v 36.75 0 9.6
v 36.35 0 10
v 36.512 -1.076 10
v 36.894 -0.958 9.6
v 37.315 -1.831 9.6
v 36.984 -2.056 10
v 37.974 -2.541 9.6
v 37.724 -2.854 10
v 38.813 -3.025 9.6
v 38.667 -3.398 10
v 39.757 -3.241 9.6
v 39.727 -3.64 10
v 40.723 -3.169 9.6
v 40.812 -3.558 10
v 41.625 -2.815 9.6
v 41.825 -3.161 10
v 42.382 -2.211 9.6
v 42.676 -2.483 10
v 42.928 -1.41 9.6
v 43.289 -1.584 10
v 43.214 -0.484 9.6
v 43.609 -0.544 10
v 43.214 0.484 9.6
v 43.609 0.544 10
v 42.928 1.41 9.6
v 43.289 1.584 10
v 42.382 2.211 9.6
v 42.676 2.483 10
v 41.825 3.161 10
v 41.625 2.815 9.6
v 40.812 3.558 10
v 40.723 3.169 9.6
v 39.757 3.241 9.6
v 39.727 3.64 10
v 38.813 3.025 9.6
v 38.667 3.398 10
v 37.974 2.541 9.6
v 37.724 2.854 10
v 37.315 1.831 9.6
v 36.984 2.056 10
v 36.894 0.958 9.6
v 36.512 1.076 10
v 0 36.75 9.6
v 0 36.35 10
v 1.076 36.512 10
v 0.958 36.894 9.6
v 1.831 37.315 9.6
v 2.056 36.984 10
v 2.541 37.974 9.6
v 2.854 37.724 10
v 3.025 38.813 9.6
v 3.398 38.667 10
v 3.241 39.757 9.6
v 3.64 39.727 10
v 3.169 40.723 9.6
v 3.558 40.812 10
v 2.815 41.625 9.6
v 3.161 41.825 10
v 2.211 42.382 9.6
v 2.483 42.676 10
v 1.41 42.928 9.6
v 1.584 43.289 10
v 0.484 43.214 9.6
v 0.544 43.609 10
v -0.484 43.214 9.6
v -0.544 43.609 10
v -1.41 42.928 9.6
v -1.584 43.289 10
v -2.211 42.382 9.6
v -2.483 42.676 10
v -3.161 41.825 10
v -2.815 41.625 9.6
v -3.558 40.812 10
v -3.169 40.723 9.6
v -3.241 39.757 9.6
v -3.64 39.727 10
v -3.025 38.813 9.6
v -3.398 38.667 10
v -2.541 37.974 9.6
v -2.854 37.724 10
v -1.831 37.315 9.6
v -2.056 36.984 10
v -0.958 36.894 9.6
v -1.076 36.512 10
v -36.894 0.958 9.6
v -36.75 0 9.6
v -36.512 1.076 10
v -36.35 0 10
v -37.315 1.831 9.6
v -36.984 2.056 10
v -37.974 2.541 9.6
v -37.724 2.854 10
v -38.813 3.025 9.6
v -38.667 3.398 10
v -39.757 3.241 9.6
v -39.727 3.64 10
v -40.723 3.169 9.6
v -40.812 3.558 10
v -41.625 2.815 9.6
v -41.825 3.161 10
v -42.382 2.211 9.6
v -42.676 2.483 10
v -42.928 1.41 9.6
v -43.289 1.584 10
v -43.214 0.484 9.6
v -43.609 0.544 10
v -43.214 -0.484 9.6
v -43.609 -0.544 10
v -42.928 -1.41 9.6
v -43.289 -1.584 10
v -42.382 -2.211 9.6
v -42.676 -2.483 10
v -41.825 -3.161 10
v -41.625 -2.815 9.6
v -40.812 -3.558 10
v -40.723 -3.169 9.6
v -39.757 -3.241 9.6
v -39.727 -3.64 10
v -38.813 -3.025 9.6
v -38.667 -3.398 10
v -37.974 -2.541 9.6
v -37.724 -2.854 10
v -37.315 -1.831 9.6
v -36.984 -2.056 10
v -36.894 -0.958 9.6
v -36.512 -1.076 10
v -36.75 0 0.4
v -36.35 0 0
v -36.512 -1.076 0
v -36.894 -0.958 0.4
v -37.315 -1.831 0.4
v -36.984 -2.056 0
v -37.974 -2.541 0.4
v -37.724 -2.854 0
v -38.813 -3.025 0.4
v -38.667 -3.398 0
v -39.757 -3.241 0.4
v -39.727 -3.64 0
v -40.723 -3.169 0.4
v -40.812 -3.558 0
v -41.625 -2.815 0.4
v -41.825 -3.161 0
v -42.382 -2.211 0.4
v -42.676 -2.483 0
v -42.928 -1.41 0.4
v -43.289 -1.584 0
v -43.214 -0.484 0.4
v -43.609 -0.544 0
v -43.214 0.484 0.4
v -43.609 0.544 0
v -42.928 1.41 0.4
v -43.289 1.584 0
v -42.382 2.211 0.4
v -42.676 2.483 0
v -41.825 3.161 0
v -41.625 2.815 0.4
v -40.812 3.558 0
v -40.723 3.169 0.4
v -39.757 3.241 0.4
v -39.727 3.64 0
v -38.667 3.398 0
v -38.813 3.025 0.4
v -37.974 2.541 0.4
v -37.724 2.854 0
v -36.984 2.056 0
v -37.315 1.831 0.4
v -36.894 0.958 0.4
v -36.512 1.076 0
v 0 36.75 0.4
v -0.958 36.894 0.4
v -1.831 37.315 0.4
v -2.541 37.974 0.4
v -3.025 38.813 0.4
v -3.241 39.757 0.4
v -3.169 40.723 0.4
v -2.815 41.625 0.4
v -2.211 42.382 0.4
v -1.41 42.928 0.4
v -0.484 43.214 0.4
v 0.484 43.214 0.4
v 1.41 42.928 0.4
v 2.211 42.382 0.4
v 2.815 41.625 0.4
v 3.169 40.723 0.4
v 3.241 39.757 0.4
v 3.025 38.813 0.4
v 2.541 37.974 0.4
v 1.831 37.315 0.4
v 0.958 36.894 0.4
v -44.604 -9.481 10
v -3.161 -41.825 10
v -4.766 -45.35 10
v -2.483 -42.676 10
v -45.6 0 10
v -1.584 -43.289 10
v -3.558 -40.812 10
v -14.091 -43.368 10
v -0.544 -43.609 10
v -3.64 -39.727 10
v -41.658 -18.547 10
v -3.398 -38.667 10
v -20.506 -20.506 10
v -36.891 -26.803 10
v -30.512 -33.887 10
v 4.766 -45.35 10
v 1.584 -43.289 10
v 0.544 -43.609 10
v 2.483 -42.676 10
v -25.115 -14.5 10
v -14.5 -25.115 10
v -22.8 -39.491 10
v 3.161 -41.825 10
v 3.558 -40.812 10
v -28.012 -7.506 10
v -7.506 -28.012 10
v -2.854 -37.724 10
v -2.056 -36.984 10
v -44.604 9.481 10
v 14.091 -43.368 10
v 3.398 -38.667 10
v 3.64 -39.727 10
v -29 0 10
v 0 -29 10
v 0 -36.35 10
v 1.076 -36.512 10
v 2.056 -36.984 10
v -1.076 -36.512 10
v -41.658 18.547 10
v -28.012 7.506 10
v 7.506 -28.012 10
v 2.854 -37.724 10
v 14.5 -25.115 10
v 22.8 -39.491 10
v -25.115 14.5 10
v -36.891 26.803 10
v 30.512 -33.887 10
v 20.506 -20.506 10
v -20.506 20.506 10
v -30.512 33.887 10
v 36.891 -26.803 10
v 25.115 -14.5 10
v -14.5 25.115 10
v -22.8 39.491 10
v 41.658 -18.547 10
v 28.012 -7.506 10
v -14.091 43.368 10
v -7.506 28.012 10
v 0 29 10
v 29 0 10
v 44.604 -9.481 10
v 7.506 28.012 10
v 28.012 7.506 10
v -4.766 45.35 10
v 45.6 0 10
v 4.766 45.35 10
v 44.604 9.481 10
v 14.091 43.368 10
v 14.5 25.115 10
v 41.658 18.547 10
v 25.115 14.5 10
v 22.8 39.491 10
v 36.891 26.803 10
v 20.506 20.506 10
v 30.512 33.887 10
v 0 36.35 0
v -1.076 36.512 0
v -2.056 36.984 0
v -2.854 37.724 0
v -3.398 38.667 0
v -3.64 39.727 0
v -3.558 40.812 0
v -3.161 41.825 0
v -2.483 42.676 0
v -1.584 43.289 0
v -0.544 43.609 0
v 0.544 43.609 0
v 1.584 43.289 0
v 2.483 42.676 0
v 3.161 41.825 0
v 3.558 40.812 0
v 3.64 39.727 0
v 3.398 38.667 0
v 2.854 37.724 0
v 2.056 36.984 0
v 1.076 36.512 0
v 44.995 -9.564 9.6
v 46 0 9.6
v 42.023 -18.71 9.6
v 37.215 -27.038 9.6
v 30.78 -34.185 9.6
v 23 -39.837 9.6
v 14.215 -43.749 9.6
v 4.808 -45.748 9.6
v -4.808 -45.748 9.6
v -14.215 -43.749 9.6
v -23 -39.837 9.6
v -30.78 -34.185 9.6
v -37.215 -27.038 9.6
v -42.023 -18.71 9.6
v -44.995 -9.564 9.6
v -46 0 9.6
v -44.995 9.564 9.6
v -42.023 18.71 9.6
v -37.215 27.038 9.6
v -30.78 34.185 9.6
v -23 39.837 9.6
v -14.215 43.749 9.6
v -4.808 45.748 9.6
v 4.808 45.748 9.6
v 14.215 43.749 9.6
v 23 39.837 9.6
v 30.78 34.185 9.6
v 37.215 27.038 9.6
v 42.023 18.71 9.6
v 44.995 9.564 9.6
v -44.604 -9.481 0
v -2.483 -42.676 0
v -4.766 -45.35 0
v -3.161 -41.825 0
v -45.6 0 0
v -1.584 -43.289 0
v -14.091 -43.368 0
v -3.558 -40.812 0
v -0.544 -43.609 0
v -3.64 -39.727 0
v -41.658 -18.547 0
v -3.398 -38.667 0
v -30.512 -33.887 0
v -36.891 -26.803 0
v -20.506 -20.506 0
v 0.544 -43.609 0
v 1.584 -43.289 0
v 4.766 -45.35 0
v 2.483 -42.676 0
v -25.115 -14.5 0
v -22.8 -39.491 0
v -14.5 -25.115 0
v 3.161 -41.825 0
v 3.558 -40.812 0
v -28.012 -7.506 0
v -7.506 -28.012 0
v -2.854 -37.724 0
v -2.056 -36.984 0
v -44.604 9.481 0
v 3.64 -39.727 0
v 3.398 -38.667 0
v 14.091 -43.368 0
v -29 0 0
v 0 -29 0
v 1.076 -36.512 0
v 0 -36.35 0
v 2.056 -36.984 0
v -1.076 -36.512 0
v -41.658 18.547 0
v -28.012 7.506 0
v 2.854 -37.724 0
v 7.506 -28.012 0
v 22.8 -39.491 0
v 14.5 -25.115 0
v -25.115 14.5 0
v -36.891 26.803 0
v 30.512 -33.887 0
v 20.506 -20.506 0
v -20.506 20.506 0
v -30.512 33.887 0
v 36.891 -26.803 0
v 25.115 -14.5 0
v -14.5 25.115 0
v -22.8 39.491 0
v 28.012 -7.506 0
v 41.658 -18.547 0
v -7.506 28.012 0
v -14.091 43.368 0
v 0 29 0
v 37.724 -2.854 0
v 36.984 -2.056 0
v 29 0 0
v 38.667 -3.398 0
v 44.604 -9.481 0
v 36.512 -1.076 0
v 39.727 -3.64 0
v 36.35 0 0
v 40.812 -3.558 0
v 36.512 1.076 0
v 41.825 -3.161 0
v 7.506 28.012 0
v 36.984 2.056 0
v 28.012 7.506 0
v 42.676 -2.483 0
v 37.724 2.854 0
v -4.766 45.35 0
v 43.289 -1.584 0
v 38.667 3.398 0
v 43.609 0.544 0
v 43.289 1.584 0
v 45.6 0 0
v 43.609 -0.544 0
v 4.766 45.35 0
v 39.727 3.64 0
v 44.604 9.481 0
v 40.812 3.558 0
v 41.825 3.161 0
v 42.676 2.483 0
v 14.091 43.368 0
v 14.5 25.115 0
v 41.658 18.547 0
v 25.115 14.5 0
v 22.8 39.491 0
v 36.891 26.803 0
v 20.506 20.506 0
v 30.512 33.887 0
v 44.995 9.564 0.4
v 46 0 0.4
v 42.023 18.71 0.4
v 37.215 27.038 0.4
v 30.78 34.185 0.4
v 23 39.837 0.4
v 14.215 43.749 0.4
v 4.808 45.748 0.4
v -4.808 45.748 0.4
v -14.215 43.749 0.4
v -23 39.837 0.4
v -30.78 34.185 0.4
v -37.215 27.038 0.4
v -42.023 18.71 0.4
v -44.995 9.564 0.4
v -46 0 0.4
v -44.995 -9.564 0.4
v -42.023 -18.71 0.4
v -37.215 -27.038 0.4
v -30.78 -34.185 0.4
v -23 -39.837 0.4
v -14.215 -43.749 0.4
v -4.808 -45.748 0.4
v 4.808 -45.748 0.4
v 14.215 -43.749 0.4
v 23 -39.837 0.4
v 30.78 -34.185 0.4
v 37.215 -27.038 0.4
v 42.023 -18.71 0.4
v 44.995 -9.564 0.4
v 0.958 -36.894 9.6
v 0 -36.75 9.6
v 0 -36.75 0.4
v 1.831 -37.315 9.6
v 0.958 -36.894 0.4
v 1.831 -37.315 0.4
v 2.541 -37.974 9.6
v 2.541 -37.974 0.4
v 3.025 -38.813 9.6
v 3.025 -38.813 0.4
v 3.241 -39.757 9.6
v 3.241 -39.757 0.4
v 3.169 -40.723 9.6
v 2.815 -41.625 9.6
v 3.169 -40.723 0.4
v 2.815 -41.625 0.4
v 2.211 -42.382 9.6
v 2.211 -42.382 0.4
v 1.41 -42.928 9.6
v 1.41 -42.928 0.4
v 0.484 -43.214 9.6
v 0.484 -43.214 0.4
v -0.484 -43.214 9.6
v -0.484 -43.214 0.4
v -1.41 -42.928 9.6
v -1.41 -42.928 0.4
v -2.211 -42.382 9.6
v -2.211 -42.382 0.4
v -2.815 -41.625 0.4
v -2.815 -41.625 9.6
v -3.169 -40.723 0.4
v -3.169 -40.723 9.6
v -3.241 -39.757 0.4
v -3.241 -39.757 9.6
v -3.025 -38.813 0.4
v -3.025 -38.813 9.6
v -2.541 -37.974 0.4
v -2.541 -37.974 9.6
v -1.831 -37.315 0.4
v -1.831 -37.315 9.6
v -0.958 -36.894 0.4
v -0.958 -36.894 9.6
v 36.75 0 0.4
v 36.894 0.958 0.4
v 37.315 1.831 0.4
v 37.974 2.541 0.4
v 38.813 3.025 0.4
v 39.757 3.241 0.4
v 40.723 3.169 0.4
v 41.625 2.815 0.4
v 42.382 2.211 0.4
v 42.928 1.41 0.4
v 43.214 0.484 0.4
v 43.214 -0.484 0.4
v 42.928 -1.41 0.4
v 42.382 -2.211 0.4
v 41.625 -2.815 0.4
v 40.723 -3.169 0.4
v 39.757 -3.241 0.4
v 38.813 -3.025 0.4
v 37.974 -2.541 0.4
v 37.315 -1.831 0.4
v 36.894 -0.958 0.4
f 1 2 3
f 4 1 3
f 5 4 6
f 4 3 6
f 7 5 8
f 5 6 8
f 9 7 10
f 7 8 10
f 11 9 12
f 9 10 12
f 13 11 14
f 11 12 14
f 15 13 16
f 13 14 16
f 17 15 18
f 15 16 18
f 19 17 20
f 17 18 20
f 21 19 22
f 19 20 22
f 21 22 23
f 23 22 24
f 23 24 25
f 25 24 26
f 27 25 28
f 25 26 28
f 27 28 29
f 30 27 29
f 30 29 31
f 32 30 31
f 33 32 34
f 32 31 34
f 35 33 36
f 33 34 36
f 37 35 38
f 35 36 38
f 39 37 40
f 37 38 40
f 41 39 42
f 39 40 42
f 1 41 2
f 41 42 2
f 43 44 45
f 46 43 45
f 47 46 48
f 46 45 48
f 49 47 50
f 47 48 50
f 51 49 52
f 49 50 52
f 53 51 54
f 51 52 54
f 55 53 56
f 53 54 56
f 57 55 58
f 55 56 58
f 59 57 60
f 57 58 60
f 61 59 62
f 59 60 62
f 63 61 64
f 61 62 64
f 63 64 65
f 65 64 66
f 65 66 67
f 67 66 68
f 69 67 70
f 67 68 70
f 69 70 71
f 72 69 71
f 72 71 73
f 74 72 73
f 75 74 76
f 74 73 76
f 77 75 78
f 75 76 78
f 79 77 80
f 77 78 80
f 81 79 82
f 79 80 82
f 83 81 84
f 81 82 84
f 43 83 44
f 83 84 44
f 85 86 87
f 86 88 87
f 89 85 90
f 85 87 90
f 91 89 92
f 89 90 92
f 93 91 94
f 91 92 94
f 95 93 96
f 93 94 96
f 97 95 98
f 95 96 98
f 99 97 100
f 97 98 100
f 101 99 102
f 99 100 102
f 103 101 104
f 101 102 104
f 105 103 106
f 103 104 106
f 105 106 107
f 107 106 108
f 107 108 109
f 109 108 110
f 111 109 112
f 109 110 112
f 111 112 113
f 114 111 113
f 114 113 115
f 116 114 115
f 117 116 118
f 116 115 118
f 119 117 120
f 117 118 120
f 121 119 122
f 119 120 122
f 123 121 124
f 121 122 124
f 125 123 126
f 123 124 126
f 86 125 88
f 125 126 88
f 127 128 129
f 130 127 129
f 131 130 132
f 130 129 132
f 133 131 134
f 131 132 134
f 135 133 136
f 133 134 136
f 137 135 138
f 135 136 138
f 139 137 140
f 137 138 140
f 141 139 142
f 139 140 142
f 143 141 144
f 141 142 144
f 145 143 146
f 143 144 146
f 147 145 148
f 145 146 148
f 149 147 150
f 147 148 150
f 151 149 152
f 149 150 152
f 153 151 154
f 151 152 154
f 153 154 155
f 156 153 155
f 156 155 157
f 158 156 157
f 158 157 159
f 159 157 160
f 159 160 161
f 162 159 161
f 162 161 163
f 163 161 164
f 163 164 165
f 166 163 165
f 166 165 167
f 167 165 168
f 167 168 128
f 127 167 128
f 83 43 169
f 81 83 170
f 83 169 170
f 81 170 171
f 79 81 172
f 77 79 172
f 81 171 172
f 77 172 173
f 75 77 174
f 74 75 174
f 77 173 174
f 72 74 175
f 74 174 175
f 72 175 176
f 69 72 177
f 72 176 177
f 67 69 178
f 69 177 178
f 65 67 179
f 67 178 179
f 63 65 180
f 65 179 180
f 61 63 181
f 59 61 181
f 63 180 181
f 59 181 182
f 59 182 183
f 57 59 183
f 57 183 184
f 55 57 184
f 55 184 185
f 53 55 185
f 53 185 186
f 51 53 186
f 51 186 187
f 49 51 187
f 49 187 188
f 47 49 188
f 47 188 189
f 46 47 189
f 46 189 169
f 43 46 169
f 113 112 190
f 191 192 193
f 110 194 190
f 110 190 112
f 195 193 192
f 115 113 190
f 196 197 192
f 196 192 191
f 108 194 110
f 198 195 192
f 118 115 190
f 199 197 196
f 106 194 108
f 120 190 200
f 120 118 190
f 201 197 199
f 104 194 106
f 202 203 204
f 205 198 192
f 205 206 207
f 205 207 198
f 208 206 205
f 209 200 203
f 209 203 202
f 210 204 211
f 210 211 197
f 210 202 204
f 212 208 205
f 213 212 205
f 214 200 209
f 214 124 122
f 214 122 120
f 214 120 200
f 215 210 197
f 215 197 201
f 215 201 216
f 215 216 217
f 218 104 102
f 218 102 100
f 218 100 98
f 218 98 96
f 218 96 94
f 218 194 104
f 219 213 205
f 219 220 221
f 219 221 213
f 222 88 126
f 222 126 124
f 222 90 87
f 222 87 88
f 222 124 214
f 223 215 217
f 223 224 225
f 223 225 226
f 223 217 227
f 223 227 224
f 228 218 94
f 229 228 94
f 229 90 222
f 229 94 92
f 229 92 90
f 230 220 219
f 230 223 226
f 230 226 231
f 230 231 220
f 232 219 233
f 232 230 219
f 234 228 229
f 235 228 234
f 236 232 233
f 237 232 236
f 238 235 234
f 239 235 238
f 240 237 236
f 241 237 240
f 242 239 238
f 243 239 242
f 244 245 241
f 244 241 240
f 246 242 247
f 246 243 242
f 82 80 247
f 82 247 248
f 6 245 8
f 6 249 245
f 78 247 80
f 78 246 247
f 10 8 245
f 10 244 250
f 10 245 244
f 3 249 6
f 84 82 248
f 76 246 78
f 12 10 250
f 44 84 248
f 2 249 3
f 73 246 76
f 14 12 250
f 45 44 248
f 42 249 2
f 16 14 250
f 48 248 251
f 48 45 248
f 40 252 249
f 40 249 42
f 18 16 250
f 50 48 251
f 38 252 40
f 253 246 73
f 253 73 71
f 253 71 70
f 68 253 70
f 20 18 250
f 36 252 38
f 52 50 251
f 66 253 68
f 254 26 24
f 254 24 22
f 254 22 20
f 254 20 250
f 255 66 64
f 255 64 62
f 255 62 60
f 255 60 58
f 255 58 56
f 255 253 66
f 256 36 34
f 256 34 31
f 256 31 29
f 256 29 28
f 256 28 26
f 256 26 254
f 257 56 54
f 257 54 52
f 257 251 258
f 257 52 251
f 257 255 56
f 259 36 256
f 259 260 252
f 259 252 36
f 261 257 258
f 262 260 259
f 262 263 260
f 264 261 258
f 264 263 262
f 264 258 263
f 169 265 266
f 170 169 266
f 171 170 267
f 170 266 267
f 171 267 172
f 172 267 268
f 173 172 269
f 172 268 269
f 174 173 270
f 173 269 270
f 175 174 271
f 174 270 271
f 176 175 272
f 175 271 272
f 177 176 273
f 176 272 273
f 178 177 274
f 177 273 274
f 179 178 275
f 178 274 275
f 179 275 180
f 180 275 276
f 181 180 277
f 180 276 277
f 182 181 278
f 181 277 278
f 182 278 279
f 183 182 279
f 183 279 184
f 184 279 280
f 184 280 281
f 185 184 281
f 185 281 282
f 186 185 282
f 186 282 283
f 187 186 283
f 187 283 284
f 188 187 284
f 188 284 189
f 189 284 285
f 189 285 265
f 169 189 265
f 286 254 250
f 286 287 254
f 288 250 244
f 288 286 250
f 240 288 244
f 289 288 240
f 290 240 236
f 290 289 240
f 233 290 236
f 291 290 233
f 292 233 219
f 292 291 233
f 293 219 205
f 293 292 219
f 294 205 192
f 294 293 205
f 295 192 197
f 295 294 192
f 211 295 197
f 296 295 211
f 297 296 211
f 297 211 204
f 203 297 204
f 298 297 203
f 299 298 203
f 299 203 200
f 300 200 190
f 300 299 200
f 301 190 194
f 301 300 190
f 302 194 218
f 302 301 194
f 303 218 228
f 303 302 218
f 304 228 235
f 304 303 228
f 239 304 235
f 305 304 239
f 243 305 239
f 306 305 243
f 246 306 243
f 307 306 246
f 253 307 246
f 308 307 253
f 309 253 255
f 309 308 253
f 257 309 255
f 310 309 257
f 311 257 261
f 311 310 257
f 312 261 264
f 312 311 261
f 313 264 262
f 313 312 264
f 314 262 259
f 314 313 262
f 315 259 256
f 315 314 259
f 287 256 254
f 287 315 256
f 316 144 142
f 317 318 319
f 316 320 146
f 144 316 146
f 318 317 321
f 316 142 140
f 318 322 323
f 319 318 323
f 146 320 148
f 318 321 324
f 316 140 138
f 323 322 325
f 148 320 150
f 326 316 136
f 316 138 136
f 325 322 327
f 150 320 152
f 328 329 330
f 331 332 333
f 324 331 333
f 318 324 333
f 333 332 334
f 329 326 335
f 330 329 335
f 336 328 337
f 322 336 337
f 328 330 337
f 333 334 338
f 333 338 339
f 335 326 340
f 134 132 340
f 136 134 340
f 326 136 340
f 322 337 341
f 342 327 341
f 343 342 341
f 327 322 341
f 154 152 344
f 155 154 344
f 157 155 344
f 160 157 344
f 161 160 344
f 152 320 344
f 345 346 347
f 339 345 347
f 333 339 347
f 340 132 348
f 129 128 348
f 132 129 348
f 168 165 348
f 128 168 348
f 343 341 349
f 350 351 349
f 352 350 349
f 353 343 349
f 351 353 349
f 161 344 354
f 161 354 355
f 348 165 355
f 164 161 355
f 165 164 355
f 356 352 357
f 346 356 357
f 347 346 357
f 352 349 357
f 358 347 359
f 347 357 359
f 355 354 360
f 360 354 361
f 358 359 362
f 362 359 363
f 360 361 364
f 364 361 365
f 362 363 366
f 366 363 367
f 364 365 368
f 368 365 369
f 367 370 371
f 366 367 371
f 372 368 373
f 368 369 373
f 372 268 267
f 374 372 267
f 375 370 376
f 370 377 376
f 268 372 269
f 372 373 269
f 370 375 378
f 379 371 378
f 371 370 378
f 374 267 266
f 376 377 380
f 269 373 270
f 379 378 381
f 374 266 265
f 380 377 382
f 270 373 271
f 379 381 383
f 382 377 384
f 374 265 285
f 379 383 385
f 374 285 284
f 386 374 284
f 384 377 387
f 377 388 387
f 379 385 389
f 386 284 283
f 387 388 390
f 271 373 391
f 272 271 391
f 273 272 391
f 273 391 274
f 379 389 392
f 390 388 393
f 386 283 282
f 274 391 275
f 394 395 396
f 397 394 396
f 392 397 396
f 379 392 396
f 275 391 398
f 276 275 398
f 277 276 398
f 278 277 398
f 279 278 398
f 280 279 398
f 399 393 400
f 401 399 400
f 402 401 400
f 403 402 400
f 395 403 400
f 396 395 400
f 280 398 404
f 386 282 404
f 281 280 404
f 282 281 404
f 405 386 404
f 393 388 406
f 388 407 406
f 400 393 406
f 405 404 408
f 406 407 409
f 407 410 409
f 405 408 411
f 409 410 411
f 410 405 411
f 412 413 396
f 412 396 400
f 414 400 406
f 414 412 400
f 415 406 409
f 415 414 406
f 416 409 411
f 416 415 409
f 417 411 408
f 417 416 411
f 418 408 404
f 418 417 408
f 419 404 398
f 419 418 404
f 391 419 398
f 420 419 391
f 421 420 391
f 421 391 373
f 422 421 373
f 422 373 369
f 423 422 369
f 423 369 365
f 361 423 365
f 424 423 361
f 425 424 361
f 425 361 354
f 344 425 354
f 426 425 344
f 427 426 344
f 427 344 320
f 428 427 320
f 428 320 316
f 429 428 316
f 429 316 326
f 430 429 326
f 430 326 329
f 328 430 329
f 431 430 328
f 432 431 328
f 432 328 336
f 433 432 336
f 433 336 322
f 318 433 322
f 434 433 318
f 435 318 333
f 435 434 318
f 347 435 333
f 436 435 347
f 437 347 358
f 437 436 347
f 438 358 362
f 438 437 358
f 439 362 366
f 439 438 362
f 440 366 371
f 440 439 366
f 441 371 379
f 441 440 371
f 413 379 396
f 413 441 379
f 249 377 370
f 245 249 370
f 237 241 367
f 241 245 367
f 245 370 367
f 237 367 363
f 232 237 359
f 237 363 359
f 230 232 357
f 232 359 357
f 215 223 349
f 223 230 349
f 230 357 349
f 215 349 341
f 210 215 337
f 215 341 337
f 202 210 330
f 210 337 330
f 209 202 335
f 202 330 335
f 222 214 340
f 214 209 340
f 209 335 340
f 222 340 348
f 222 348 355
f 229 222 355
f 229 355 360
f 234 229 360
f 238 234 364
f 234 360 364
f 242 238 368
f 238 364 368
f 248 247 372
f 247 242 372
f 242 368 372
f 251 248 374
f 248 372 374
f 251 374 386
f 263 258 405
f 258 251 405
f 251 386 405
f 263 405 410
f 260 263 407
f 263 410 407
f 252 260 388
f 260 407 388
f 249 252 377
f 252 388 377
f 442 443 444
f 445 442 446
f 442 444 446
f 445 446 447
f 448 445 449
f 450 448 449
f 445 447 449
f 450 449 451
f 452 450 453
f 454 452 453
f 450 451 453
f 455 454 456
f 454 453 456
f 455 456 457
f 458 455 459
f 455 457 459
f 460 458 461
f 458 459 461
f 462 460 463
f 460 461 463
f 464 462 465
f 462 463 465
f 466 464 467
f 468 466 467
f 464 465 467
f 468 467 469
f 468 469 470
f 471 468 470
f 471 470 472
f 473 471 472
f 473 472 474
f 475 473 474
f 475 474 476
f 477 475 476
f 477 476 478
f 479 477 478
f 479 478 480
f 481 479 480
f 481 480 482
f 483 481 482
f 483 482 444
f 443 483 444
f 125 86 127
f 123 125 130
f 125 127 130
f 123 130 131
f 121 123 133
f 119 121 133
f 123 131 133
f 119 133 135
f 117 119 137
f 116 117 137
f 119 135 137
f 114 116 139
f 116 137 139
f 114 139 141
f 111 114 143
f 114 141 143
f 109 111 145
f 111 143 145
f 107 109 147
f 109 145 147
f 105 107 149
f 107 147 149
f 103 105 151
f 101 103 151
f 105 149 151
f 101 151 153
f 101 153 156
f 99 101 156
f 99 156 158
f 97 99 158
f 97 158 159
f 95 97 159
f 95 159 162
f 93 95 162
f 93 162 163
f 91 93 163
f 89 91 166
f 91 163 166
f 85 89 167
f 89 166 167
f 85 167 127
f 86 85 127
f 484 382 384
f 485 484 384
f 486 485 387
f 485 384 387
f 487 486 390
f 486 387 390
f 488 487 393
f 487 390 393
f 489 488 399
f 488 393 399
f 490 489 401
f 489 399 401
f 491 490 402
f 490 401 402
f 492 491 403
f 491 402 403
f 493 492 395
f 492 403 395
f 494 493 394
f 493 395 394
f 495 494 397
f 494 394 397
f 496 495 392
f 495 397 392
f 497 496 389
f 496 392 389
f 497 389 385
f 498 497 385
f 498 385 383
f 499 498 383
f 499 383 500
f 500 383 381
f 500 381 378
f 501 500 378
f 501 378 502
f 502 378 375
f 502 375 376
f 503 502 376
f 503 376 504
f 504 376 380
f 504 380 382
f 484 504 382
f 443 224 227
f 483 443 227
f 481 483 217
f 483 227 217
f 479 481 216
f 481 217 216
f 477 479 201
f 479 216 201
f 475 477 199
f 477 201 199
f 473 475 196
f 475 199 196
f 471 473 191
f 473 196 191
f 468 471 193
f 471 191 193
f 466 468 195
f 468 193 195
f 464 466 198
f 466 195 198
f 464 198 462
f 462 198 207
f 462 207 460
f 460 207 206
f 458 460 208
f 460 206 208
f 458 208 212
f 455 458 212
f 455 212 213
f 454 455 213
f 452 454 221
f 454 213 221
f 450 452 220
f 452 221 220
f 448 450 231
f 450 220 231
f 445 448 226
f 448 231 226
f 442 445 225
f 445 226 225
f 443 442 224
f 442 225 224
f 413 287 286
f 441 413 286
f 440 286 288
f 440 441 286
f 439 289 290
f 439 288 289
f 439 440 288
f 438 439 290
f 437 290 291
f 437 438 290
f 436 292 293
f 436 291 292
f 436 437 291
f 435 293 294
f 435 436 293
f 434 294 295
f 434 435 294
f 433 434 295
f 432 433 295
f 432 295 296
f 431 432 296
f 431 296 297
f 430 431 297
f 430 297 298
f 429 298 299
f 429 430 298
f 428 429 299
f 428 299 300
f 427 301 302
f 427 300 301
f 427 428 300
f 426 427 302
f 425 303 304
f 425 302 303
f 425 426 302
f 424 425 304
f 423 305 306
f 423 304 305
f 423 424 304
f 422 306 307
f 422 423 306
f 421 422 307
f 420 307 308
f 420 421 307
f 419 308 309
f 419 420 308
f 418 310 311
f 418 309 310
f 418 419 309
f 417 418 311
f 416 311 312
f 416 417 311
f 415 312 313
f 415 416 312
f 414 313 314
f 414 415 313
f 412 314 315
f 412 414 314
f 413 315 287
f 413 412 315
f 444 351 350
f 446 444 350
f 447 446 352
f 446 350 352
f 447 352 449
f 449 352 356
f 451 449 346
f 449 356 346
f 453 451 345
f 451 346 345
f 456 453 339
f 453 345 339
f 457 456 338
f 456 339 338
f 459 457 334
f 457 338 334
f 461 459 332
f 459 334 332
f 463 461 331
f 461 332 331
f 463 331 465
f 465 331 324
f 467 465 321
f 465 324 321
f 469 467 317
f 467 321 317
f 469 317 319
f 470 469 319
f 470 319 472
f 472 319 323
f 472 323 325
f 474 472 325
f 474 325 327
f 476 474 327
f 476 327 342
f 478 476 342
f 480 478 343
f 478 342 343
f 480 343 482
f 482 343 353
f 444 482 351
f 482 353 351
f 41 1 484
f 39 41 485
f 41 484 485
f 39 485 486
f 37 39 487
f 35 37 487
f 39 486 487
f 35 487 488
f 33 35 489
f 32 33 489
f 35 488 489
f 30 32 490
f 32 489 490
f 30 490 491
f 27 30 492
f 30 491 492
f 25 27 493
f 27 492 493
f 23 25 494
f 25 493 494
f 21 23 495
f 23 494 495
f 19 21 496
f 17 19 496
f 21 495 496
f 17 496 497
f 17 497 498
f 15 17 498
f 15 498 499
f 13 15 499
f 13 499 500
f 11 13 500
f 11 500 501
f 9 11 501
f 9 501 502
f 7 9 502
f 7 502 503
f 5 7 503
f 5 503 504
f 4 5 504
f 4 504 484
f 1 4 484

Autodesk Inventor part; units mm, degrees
ref_plane "YZ Plane" through (0, 0, 0) normal (1, 0, 0) x (0, 1, 0)
ref_plane "XZ Plane" through (0, 0, 0) normal (0, 1, 0) x (-1, 0, 0)
ref_plane "XY Plane" through (0, 0, 0) normal (0, 0, 1) x (1, 0, 0)
sketch "Sketch1" plane through (0, 0, 0) normal (0, 0, 1) x (1, 0, 0)
  circle A0 centre (0, 0) radius 46
  circle A1 centre (0, 0) radius 29
  dimension "d0" = 58
  dimension "d1" = 92
extrude "Extrusion1" add sketch "Sketch1" along normal blind 10
sketch "Sketch2" plane through (0, 0, 10) normal (0, 0, 1) x (1, 0, 0)
  circle A0 centre (0, 0) radius 29 projected
  circle A1 centre (0, 0) radius 40 construction
  point P0 (0, 40)
  dimension "d4" = 80
hole "Hole1" at (0, 40, 10) direction (0, 0, -1) diameter 6.5 end through all
pattern_circular "Circular Pattern1" count 4 over 360 about axis through (0, 0, 0) along (0, 0, 1) of "Hole1"
chamfer "Chamfer1" distance 0.4 angle 45 10 edges at (-46, 0, 0) (-46, 0, 10) (0, 43.25, 0) (-43.25, 0, 0) (43.25, 0, 0) (0, -43.25, 0) (43.25, 0, 10) (0, 43.25, 10) (0, -43.25, 10) (-43.25, 0, 10)
equation "\"d0\" = ID"
equation "\"d1\" = OD"
equation "\"OD\" = 92"
equation "\"ID\" = 58"
properties part number "pld_flange_flat_ak"
